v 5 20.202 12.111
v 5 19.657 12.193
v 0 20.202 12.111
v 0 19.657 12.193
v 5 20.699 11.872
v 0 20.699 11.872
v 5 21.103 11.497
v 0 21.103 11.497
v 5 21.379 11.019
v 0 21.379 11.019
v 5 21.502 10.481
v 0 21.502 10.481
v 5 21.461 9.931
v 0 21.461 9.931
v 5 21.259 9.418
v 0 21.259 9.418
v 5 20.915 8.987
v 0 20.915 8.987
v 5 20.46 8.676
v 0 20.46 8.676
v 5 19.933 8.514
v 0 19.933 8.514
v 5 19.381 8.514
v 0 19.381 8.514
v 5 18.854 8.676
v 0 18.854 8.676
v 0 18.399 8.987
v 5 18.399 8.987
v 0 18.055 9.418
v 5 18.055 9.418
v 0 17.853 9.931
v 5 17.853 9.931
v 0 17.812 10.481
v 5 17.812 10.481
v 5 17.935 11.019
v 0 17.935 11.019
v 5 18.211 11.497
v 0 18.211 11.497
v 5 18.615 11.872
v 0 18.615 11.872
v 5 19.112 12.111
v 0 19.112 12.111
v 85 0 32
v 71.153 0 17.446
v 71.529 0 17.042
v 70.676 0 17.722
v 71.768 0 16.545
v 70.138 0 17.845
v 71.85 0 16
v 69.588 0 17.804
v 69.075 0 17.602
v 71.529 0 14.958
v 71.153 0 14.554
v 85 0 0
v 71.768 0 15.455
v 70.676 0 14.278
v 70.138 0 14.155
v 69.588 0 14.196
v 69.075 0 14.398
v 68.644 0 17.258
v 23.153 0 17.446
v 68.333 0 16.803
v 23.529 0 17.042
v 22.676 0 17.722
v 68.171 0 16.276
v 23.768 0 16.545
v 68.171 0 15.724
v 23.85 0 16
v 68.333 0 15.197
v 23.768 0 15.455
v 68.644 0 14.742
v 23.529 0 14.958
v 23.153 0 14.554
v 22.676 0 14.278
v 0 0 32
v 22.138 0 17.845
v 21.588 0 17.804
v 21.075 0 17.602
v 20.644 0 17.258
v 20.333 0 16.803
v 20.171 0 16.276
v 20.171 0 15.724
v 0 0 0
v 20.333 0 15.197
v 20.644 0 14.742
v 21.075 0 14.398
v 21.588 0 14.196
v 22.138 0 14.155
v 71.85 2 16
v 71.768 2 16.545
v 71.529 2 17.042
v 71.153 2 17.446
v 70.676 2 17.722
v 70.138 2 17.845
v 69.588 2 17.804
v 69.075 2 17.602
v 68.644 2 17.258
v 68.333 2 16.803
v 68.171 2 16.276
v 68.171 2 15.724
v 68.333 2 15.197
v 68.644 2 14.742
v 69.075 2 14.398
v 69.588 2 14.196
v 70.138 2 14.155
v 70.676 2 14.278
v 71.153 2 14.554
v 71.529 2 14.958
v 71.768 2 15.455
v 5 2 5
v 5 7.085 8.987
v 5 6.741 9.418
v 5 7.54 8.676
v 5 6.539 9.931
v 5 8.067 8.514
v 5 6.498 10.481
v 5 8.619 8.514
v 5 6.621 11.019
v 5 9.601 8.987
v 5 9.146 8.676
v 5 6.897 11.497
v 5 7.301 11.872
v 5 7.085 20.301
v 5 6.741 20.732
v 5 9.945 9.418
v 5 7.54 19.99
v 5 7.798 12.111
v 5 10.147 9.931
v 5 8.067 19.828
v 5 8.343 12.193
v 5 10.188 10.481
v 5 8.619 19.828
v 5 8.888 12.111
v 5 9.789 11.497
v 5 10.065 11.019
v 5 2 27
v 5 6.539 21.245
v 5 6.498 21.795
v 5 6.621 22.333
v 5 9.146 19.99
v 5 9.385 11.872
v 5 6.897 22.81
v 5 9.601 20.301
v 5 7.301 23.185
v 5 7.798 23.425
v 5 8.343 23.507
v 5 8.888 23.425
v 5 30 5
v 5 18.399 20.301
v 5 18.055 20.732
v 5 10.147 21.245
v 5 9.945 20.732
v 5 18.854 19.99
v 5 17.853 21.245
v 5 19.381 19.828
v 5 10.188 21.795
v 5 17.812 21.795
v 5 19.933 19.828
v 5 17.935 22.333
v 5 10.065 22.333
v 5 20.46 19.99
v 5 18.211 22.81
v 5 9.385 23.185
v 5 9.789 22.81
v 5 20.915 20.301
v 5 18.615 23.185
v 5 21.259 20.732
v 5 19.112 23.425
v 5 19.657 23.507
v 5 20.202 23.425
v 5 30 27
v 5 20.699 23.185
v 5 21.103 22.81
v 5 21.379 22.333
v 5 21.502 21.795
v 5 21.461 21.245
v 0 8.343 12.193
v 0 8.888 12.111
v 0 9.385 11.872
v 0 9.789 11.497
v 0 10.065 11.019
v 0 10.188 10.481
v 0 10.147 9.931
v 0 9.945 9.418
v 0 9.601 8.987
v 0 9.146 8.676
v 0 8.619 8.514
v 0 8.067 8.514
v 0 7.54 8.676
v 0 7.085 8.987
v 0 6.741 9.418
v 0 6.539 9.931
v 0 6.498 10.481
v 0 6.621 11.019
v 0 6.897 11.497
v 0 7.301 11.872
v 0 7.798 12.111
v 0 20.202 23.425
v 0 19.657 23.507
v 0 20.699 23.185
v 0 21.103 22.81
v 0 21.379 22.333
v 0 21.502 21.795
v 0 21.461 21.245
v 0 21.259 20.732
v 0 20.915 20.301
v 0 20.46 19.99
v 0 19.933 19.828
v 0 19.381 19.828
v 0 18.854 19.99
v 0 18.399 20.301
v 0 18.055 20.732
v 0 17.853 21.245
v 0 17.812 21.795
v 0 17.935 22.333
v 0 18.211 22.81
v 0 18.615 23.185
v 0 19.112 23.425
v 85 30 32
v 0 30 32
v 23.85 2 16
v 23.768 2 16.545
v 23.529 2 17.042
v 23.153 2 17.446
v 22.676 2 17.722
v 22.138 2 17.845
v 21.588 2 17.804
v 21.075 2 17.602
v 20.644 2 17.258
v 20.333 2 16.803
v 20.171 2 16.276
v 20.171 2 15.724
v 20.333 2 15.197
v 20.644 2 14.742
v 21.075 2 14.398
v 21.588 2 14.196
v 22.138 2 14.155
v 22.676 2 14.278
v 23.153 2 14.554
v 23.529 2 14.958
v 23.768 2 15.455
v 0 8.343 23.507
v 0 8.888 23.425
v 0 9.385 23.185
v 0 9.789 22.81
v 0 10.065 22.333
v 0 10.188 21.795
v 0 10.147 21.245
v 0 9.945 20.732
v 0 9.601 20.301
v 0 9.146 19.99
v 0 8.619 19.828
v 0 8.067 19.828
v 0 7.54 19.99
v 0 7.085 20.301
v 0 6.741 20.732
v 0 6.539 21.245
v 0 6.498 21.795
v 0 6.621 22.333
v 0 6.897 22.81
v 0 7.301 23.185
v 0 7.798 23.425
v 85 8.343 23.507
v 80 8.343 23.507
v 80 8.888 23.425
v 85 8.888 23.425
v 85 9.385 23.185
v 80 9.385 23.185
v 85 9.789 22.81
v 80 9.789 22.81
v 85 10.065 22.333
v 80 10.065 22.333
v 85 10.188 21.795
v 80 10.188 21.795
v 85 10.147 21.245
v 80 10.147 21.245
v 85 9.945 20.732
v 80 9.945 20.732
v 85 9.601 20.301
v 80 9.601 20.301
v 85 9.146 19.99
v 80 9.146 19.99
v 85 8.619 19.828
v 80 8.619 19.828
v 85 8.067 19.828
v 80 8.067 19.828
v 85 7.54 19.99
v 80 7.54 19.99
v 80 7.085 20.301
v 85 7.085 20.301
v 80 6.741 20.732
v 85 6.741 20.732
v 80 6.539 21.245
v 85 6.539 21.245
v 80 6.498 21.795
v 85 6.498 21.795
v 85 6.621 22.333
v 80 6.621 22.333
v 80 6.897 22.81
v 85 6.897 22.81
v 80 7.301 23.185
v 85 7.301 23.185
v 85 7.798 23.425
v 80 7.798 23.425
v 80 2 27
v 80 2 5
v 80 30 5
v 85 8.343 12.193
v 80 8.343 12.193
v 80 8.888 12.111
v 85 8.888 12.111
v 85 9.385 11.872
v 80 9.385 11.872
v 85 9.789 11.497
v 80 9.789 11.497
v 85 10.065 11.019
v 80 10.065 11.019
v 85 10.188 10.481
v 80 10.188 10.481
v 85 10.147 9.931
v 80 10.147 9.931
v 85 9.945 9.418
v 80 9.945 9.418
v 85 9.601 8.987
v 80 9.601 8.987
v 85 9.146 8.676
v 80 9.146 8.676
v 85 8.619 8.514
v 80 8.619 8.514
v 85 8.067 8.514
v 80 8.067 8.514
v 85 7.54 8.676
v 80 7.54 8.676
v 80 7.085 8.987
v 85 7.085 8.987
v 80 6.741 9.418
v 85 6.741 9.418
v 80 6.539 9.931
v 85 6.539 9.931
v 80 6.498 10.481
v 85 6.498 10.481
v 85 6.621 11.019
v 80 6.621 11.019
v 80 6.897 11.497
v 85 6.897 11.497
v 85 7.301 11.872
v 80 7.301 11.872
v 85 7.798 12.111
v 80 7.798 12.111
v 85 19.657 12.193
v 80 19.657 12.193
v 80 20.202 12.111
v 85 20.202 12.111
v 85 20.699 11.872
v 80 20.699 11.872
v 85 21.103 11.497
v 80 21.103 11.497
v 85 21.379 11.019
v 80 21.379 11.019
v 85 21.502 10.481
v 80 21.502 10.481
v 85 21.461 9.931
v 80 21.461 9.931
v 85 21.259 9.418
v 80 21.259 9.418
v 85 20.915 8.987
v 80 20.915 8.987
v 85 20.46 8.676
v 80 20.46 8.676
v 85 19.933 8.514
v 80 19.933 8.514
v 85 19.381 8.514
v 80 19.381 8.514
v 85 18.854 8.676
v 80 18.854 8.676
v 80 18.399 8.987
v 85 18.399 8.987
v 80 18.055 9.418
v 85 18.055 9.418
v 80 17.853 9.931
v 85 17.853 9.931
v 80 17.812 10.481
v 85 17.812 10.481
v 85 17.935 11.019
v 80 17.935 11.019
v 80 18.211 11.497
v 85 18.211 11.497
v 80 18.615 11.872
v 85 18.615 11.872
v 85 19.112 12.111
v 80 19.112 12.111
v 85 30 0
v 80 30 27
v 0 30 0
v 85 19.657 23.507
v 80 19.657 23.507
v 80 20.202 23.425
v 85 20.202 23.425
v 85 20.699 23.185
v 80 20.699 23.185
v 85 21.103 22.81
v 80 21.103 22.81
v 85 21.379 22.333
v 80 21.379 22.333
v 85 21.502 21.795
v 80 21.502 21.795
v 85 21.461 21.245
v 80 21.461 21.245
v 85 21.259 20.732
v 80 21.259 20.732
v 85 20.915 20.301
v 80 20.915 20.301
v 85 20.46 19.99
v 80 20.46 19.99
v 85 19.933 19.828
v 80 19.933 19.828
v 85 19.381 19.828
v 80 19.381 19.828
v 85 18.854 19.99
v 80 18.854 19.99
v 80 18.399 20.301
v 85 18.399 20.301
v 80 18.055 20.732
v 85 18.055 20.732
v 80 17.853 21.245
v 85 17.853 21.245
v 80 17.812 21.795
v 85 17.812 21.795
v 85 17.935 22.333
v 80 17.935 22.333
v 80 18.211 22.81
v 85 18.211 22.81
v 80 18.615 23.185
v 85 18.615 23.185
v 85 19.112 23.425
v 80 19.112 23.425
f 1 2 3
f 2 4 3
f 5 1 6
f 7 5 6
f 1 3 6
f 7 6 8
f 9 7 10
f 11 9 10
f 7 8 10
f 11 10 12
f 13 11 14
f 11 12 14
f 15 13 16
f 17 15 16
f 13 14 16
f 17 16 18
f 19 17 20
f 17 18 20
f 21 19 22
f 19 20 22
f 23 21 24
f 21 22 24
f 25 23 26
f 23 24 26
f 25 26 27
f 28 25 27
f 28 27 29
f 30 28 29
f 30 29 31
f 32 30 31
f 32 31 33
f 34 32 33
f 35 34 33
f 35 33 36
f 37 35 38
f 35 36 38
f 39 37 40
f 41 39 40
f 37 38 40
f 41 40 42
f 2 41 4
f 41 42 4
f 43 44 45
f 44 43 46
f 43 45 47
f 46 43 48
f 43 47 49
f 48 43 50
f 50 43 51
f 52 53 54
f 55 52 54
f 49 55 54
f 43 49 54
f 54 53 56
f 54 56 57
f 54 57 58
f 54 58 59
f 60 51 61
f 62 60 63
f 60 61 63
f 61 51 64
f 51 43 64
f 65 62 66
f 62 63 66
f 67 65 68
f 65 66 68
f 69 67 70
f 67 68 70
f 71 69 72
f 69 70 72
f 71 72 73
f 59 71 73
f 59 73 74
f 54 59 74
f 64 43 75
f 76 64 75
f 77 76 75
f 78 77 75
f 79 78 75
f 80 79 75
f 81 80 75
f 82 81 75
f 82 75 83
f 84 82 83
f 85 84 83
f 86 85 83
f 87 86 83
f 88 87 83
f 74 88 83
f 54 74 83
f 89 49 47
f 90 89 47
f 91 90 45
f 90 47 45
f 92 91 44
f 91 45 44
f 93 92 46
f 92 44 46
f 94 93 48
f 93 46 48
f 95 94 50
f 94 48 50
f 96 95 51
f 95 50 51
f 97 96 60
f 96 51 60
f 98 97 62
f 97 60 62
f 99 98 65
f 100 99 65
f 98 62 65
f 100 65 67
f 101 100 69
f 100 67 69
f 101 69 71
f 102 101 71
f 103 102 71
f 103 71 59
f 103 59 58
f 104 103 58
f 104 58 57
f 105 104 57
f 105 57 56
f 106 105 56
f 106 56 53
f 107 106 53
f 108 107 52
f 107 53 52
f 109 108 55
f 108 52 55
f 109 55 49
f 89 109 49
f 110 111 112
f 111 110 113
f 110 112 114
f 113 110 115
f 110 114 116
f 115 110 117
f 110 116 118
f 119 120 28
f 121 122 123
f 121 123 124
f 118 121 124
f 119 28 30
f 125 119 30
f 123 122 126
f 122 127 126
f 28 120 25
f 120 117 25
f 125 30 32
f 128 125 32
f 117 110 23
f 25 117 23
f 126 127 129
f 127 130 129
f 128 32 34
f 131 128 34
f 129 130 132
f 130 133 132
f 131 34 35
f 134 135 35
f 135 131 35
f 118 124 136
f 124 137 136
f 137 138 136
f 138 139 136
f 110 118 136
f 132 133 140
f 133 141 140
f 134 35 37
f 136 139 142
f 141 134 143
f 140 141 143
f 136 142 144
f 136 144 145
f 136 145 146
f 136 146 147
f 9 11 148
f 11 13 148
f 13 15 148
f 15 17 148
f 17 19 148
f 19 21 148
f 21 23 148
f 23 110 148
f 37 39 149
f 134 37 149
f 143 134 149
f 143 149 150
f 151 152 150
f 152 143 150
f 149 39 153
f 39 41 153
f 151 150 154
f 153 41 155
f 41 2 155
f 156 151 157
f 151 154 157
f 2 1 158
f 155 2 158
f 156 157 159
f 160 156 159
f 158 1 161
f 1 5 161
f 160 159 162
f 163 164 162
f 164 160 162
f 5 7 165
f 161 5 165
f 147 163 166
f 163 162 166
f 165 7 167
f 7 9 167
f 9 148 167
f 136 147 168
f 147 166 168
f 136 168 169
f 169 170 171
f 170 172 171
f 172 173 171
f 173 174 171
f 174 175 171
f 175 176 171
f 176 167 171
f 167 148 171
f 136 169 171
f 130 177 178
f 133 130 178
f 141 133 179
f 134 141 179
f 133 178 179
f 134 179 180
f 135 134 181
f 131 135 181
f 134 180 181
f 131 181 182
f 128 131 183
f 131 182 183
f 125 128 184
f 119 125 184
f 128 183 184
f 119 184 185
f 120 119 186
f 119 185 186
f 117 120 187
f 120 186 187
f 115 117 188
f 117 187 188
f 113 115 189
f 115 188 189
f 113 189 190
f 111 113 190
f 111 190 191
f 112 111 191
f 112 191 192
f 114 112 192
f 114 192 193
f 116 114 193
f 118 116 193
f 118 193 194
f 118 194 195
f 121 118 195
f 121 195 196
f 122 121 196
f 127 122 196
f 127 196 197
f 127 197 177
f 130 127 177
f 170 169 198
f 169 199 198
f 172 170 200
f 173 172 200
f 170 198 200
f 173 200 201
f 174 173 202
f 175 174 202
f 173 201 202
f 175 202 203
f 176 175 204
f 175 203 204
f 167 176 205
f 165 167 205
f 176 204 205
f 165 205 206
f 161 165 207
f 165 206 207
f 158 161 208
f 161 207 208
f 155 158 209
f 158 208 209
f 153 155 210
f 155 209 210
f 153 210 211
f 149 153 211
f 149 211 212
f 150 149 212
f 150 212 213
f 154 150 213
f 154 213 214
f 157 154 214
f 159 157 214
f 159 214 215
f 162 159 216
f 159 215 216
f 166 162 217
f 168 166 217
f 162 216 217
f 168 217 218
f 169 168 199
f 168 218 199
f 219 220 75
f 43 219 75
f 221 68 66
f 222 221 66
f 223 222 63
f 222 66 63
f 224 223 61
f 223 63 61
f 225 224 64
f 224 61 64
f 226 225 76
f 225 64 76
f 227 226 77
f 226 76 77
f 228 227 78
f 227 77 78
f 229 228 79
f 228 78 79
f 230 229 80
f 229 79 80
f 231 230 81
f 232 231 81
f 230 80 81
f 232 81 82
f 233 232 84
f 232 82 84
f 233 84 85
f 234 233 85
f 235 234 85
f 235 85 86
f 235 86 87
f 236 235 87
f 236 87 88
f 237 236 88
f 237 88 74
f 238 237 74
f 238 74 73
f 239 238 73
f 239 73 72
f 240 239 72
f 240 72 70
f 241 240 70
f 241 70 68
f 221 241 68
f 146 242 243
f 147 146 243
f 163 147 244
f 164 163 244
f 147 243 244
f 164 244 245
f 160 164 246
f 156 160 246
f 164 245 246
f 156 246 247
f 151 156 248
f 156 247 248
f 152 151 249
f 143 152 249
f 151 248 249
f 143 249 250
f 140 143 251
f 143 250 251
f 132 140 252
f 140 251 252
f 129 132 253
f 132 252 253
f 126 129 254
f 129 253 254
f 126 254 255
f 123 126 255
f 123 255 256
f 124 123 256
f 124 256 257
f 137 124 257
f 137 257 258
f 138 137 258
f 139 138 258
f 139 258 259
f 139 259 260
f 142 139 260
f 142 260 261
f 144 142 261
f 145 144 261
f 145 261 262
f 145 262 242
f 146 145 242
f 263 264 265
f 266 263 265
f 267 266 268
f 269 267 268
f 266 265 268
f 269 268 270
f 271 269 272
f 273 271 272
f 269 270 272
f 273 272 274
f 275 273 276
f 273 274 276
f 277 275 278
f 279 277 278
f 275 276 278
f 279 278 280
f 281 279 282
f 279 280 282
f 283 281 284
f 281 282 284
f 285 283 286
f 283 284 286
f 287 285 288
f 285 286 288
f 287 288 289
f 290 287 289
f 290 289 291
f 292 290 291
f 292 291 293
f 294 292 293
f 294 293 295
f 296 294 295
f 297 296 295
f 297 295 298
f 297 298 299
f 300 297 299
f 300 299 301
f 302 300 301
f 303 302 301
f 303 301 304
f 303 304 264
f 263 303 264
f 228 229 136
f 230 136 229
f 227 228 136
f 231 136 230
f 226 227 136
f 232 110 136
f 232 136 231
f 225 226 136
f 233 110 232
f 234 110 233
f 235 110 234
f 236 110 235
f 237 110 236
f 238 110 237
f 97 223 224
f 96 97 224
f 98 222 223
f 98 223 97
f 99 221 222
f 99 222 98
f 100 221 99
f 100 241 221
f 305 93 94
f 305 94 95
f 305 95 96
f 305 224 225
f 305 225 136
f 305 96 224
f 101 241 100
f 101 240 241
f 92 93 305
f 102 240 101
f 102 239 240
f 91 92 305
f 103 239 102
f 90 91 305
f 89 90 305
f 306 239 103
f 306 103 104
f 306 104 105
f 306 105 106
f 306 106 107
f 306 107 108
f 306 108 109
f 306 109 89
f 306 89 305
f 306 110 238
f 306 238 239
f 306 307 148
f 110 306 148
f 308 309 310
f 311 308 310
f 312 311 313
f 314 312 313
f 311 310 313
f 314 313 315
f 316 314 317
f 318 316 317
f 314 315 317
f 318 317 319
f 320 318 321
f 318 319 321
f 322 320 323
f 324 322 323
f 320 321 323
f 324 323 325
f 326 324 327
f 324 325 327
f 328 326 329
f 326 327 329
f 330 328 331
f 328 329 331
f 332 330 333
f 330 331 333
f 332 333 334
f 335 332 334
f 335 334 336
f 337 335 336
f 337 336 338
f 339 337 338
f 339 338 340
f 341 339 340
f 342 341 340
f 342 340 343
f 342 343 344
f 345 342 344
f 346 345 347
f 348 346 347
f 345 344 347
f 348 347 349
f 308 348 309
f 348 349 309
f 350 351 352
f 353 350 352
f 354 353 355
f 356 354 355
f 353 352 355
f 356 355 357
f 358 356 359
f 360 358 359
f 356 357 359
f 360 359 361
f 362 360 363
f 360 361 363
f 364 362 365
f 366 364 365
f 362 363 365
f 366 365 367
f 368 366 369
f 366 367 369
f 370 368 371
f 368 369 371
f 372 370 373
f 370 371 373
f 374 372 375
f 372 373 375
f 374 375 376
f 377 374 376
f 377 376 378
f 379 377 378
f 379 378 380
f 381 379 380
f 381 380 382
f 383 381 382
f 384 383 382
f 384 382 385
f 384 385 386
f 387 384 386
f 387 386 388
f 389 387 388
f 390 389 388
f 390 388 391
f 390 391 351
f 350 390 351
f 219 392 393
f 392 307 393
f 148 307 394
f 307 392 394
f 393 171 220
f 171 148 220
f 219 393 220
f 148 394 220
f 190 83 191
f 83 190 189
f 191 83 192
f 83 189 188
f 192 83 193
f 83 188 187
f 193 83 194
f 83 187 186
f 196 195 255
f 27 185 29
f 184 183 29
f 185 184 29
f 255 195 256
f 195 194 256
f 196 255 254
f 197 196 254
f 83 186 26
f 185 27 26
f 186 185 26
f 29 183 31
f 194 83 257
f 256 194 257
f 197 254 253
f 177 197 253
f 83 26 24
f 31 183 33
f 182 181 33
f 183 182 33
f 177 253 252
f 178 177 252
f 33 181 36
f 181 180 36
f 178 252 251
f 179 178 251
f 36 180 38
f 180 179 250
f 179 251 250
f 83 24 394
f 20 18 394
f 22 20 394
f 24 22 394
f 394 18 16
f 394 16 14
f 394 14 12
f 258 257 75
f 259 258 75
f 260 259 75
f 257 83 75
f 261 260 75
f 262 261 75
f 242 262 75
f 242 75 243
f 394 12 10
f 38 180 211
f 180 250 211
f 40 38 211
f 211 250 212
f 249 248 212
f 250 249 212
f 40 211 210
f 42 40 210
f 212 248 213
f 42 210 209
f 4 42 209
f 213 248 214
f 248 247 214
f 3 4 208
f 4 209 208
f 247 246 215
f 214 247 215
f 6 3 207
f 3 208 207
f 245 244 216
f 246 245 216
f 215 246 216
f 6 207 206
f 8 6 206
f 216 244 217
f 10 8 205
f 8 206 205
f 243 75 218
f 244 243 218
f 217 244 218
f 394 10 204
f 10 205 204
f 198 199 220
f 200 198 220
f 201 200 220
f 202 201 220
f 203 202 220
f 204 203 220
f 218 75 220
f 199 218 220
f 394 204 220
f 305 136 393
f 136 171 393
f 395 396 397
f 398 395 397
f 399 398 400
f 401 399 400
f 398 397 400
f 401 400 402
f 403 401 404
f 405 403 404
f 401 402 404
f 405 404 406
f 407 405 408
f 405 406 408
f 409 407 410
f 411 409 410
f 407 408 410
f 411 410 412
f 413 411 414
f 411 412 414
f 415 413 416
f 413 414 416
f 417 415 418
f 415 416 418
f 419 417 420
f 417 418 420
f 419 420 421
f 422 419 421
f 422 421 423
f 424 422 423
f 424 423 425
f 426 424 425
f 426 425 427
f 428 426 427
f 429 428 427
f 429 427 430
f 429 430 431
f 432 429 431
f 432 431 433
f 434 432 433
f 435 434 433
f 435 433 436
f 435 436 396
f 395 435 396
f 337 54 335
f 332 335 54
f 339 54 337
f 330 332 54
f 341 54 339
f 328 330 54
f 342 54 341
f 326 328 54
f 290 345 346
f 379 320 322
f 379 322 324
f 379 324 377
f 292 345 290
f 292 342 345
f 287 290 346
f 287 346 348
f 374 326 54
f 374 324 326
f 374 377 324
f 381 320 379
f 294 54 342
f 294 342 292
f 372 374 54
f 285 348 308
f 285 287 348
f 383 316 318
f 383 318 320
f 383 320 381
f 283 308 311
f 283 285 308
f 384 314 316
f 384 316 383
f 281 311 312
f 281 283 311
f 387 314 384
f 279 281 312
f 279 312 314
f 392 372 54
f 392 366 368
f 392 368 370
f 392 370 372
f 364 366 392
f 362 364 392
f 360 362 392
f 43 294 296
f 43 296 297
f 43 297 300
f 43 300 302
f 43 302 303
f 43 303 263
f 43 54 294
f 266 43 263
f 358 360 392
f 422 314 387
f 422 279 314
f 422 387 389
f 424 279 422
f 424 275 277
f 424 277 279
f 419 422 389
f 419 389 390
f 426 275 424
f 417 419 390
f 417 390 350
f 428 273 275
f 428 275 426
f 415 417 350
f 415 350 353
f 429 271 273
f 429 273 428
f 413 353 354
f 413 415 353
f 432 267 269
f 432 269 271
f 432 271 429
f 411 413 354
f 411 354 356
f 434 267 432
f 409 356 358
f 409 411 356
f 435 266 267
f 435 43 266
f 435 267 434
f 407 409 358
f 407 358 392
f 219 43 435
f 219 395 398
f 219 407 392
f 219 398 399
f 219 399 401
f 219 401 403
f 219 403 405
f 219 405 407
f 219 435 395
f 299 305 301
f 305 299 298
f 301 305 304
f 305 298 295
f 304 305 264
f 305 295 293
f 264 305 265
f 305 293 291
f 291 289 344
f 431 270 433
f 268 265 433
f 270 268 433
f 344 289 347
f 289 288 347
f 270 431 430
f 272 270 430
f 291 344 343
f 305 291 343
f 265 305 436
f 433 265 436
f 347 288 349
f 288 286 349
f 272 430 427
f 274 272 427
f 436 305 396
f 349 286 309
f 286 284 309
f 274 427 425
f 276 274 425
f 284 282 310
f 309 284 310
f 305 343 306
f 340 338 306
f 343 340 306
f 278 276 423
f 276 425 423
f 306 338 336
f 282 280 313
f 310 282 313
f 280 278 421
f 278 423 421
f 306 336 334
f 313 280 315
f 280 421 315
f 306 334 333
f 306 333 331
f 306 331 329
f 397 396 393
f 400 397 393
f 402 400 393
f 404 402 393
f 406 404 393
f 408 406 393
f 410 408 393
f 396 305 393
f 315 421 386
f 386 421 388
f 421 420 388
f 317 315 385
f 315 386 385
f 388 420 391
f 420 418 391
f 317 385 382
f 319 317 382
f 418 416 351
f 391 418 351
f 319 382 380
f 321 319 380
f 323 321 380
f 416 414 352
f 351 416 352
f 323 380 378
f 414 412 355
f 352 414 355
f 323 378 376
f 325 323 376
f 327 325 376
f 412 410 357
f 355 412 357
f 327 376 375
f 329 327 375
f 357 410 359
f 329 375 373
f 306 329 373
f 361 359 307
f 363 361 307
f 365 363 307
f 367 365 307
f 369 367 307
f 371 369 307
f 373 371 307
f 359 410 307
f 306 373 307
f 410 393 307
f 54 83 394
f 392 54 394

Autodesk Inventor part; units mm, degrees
ref_plane "YZ Plane" through (0, 0, 0) normal (1, 0, 0) x (0, 1, 0)
ref_plane "XZ Plane" through (0, 0, 0) normal (0, 1, 0) x (-1, 0, 0)
ref_plane "XY Plane" through (0, 0, 0) normal (0, 0, 1) x (1, 0, 0)
sketch "Sketch1" plane through (0, 0, 0) normal (1, 0, 0) x (0, 1, 0)
  line L0 (0, 0) -> (30, 0)
  line L1 (30, 0) -> (30, 32)
  line L2 (30, 32) -> (0, 32)
  line L3 (0, 32) -> (0, 0)
  dimension "d0" = 30
  dimension "d1" = 32
extrude "Extrusion1" add sketch "Sketch1" along normal blind 85
sketch "Sketch2" plane through (0, 30, 32) normal (0, 1, 0) x (1, 0, 0)
  line L0 (0, 32) -> (0, 0) projected
  line L1 (0, 0) -> (85, 0) projected
  line L2 (85, 32) -> (85, 0) projected
  line L3 (0, 32) -> (85, 32) projected
  line L4 (5, 5) -> (80, 5)
  line L5 (80, 5) -> (80, 27)
  line L6 (80, 27) -> (5, 27)
  line L7 (5, 27) -> (5, 5)
  line L8 (5, 5) -> (80, 27) construction
  line L9 (80, 5) -> (5, 27) construction
  point P0 (42.5, 16)
  dimension "d12" = 75
  dimension "d13" = 22
extrude "Extrusion2" cut sketch "Sketch2" against normal blind 28 contours L7 L6 L5 L4
sketch "Sketch3" plane through (0, 0, 0) normal (-1, 0, 0) x (0, 0, 1)
  circle A0 centre (21.6569, 19.6569) radius 1.85
  circle A1 centre (21.6569, 8.3431) radius 1.85
  circle A2 centre (10.3431, 8.3431) radius 1.85
  circle A3 centre (10.3431, 19.6569) radius 1.85
  point P0 (0, 0)
extrude "Extrusion3" cut sketch "Sketch3" against normal through all
sketch "Sketch4" plane through (0, 0, 0) normal (0, -1, 0) x (1, 0, 0)
  circle A0 centre (22, 16) radius 1.85
  circle A1 centre (70, 16) radius 1.85
  point P0 (0, 0)
extrude "Extrusion5" cut sketch "Sketch4" against normal through all
properties part number "sidebracket"
